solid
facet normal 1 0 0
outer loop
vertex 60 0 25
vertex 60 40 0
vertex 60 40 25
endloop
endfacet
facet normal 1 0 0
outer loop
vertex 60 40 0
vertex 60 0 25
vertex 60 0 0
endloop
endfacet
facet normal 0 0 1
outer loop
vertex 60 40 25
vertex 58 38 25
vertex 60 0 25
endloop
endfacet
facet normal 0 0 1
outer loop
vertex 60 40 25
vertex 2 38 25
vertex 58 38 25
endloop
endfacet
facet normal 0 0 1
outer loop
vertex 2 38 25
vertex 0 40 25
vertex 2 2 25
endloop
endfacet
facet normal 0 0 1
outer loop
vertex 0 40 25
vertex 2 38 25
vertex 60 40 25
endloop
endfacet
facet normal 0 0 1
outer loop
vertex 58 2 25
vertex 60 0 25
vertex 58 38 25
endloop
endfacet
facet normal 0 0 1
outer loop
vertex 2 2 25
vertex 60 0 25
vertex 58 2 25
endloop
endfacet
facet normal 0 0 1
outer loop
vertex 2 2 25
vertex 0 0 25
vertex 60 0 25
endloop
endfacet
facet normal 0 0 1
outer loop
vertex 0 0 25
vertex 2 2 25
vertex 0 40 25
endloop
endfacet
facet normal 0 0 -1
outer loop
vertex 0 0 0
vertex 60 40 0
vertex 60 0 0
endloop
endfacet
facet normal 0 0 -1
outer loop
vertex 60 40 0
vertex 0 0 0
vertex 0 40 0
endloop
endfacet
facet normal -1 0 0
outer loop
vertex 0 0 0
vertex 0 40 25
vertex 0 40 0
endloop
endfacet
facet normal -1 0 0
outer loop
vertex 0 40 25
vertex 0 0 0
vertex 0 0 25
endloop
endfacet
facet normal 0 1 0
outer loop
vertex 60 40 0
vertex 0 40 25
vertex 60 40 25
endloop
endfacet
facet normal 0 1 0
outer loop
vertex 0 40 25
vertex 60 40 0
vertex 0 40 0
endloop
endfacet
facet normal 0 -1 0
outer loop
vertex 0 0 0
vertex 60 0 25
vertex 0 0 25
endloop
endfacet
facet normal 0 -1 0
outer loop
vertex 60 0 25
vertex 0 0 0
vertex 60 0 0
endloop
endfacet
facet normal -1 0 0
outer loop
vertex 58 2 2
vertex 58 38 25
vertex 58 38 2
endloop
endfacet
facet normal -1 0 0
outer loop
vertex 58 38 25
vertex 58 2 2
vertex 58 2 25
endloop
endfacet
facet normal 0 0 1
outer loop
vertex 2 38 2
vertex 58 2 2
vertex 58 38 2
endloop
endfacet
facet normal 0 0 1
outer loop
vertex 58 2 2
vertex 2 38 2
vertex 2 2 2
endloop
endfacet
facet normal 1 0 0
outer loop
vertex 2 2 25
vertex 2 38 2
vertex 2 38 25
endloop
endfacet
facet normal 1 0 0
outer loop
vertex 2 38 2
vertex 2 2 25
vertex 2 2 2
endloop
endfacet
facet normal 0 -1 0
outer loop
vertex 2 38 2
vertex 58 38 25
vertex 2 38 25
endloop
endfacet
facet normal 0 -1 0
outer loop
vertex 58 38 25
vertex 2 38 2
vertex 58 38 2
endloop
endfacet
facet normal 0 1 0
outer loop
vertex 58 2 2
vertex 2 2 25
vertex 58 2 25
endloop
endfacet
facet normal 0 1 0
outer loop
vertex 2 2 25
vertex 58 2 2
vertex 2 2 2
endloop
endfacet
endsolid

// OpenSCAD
// A lidded box 60 x 40 x 25 mm with 2 mm walls: the parameters are the contract, the numbers are checked by scad-measure.
w = 60; d = 40; h = 25; wall = 2;
difference() {
	cube([w, d, h]);
	translate([wall, wall, wall]) cube([w - 2*wall, d - 2*wall, h]);
}
